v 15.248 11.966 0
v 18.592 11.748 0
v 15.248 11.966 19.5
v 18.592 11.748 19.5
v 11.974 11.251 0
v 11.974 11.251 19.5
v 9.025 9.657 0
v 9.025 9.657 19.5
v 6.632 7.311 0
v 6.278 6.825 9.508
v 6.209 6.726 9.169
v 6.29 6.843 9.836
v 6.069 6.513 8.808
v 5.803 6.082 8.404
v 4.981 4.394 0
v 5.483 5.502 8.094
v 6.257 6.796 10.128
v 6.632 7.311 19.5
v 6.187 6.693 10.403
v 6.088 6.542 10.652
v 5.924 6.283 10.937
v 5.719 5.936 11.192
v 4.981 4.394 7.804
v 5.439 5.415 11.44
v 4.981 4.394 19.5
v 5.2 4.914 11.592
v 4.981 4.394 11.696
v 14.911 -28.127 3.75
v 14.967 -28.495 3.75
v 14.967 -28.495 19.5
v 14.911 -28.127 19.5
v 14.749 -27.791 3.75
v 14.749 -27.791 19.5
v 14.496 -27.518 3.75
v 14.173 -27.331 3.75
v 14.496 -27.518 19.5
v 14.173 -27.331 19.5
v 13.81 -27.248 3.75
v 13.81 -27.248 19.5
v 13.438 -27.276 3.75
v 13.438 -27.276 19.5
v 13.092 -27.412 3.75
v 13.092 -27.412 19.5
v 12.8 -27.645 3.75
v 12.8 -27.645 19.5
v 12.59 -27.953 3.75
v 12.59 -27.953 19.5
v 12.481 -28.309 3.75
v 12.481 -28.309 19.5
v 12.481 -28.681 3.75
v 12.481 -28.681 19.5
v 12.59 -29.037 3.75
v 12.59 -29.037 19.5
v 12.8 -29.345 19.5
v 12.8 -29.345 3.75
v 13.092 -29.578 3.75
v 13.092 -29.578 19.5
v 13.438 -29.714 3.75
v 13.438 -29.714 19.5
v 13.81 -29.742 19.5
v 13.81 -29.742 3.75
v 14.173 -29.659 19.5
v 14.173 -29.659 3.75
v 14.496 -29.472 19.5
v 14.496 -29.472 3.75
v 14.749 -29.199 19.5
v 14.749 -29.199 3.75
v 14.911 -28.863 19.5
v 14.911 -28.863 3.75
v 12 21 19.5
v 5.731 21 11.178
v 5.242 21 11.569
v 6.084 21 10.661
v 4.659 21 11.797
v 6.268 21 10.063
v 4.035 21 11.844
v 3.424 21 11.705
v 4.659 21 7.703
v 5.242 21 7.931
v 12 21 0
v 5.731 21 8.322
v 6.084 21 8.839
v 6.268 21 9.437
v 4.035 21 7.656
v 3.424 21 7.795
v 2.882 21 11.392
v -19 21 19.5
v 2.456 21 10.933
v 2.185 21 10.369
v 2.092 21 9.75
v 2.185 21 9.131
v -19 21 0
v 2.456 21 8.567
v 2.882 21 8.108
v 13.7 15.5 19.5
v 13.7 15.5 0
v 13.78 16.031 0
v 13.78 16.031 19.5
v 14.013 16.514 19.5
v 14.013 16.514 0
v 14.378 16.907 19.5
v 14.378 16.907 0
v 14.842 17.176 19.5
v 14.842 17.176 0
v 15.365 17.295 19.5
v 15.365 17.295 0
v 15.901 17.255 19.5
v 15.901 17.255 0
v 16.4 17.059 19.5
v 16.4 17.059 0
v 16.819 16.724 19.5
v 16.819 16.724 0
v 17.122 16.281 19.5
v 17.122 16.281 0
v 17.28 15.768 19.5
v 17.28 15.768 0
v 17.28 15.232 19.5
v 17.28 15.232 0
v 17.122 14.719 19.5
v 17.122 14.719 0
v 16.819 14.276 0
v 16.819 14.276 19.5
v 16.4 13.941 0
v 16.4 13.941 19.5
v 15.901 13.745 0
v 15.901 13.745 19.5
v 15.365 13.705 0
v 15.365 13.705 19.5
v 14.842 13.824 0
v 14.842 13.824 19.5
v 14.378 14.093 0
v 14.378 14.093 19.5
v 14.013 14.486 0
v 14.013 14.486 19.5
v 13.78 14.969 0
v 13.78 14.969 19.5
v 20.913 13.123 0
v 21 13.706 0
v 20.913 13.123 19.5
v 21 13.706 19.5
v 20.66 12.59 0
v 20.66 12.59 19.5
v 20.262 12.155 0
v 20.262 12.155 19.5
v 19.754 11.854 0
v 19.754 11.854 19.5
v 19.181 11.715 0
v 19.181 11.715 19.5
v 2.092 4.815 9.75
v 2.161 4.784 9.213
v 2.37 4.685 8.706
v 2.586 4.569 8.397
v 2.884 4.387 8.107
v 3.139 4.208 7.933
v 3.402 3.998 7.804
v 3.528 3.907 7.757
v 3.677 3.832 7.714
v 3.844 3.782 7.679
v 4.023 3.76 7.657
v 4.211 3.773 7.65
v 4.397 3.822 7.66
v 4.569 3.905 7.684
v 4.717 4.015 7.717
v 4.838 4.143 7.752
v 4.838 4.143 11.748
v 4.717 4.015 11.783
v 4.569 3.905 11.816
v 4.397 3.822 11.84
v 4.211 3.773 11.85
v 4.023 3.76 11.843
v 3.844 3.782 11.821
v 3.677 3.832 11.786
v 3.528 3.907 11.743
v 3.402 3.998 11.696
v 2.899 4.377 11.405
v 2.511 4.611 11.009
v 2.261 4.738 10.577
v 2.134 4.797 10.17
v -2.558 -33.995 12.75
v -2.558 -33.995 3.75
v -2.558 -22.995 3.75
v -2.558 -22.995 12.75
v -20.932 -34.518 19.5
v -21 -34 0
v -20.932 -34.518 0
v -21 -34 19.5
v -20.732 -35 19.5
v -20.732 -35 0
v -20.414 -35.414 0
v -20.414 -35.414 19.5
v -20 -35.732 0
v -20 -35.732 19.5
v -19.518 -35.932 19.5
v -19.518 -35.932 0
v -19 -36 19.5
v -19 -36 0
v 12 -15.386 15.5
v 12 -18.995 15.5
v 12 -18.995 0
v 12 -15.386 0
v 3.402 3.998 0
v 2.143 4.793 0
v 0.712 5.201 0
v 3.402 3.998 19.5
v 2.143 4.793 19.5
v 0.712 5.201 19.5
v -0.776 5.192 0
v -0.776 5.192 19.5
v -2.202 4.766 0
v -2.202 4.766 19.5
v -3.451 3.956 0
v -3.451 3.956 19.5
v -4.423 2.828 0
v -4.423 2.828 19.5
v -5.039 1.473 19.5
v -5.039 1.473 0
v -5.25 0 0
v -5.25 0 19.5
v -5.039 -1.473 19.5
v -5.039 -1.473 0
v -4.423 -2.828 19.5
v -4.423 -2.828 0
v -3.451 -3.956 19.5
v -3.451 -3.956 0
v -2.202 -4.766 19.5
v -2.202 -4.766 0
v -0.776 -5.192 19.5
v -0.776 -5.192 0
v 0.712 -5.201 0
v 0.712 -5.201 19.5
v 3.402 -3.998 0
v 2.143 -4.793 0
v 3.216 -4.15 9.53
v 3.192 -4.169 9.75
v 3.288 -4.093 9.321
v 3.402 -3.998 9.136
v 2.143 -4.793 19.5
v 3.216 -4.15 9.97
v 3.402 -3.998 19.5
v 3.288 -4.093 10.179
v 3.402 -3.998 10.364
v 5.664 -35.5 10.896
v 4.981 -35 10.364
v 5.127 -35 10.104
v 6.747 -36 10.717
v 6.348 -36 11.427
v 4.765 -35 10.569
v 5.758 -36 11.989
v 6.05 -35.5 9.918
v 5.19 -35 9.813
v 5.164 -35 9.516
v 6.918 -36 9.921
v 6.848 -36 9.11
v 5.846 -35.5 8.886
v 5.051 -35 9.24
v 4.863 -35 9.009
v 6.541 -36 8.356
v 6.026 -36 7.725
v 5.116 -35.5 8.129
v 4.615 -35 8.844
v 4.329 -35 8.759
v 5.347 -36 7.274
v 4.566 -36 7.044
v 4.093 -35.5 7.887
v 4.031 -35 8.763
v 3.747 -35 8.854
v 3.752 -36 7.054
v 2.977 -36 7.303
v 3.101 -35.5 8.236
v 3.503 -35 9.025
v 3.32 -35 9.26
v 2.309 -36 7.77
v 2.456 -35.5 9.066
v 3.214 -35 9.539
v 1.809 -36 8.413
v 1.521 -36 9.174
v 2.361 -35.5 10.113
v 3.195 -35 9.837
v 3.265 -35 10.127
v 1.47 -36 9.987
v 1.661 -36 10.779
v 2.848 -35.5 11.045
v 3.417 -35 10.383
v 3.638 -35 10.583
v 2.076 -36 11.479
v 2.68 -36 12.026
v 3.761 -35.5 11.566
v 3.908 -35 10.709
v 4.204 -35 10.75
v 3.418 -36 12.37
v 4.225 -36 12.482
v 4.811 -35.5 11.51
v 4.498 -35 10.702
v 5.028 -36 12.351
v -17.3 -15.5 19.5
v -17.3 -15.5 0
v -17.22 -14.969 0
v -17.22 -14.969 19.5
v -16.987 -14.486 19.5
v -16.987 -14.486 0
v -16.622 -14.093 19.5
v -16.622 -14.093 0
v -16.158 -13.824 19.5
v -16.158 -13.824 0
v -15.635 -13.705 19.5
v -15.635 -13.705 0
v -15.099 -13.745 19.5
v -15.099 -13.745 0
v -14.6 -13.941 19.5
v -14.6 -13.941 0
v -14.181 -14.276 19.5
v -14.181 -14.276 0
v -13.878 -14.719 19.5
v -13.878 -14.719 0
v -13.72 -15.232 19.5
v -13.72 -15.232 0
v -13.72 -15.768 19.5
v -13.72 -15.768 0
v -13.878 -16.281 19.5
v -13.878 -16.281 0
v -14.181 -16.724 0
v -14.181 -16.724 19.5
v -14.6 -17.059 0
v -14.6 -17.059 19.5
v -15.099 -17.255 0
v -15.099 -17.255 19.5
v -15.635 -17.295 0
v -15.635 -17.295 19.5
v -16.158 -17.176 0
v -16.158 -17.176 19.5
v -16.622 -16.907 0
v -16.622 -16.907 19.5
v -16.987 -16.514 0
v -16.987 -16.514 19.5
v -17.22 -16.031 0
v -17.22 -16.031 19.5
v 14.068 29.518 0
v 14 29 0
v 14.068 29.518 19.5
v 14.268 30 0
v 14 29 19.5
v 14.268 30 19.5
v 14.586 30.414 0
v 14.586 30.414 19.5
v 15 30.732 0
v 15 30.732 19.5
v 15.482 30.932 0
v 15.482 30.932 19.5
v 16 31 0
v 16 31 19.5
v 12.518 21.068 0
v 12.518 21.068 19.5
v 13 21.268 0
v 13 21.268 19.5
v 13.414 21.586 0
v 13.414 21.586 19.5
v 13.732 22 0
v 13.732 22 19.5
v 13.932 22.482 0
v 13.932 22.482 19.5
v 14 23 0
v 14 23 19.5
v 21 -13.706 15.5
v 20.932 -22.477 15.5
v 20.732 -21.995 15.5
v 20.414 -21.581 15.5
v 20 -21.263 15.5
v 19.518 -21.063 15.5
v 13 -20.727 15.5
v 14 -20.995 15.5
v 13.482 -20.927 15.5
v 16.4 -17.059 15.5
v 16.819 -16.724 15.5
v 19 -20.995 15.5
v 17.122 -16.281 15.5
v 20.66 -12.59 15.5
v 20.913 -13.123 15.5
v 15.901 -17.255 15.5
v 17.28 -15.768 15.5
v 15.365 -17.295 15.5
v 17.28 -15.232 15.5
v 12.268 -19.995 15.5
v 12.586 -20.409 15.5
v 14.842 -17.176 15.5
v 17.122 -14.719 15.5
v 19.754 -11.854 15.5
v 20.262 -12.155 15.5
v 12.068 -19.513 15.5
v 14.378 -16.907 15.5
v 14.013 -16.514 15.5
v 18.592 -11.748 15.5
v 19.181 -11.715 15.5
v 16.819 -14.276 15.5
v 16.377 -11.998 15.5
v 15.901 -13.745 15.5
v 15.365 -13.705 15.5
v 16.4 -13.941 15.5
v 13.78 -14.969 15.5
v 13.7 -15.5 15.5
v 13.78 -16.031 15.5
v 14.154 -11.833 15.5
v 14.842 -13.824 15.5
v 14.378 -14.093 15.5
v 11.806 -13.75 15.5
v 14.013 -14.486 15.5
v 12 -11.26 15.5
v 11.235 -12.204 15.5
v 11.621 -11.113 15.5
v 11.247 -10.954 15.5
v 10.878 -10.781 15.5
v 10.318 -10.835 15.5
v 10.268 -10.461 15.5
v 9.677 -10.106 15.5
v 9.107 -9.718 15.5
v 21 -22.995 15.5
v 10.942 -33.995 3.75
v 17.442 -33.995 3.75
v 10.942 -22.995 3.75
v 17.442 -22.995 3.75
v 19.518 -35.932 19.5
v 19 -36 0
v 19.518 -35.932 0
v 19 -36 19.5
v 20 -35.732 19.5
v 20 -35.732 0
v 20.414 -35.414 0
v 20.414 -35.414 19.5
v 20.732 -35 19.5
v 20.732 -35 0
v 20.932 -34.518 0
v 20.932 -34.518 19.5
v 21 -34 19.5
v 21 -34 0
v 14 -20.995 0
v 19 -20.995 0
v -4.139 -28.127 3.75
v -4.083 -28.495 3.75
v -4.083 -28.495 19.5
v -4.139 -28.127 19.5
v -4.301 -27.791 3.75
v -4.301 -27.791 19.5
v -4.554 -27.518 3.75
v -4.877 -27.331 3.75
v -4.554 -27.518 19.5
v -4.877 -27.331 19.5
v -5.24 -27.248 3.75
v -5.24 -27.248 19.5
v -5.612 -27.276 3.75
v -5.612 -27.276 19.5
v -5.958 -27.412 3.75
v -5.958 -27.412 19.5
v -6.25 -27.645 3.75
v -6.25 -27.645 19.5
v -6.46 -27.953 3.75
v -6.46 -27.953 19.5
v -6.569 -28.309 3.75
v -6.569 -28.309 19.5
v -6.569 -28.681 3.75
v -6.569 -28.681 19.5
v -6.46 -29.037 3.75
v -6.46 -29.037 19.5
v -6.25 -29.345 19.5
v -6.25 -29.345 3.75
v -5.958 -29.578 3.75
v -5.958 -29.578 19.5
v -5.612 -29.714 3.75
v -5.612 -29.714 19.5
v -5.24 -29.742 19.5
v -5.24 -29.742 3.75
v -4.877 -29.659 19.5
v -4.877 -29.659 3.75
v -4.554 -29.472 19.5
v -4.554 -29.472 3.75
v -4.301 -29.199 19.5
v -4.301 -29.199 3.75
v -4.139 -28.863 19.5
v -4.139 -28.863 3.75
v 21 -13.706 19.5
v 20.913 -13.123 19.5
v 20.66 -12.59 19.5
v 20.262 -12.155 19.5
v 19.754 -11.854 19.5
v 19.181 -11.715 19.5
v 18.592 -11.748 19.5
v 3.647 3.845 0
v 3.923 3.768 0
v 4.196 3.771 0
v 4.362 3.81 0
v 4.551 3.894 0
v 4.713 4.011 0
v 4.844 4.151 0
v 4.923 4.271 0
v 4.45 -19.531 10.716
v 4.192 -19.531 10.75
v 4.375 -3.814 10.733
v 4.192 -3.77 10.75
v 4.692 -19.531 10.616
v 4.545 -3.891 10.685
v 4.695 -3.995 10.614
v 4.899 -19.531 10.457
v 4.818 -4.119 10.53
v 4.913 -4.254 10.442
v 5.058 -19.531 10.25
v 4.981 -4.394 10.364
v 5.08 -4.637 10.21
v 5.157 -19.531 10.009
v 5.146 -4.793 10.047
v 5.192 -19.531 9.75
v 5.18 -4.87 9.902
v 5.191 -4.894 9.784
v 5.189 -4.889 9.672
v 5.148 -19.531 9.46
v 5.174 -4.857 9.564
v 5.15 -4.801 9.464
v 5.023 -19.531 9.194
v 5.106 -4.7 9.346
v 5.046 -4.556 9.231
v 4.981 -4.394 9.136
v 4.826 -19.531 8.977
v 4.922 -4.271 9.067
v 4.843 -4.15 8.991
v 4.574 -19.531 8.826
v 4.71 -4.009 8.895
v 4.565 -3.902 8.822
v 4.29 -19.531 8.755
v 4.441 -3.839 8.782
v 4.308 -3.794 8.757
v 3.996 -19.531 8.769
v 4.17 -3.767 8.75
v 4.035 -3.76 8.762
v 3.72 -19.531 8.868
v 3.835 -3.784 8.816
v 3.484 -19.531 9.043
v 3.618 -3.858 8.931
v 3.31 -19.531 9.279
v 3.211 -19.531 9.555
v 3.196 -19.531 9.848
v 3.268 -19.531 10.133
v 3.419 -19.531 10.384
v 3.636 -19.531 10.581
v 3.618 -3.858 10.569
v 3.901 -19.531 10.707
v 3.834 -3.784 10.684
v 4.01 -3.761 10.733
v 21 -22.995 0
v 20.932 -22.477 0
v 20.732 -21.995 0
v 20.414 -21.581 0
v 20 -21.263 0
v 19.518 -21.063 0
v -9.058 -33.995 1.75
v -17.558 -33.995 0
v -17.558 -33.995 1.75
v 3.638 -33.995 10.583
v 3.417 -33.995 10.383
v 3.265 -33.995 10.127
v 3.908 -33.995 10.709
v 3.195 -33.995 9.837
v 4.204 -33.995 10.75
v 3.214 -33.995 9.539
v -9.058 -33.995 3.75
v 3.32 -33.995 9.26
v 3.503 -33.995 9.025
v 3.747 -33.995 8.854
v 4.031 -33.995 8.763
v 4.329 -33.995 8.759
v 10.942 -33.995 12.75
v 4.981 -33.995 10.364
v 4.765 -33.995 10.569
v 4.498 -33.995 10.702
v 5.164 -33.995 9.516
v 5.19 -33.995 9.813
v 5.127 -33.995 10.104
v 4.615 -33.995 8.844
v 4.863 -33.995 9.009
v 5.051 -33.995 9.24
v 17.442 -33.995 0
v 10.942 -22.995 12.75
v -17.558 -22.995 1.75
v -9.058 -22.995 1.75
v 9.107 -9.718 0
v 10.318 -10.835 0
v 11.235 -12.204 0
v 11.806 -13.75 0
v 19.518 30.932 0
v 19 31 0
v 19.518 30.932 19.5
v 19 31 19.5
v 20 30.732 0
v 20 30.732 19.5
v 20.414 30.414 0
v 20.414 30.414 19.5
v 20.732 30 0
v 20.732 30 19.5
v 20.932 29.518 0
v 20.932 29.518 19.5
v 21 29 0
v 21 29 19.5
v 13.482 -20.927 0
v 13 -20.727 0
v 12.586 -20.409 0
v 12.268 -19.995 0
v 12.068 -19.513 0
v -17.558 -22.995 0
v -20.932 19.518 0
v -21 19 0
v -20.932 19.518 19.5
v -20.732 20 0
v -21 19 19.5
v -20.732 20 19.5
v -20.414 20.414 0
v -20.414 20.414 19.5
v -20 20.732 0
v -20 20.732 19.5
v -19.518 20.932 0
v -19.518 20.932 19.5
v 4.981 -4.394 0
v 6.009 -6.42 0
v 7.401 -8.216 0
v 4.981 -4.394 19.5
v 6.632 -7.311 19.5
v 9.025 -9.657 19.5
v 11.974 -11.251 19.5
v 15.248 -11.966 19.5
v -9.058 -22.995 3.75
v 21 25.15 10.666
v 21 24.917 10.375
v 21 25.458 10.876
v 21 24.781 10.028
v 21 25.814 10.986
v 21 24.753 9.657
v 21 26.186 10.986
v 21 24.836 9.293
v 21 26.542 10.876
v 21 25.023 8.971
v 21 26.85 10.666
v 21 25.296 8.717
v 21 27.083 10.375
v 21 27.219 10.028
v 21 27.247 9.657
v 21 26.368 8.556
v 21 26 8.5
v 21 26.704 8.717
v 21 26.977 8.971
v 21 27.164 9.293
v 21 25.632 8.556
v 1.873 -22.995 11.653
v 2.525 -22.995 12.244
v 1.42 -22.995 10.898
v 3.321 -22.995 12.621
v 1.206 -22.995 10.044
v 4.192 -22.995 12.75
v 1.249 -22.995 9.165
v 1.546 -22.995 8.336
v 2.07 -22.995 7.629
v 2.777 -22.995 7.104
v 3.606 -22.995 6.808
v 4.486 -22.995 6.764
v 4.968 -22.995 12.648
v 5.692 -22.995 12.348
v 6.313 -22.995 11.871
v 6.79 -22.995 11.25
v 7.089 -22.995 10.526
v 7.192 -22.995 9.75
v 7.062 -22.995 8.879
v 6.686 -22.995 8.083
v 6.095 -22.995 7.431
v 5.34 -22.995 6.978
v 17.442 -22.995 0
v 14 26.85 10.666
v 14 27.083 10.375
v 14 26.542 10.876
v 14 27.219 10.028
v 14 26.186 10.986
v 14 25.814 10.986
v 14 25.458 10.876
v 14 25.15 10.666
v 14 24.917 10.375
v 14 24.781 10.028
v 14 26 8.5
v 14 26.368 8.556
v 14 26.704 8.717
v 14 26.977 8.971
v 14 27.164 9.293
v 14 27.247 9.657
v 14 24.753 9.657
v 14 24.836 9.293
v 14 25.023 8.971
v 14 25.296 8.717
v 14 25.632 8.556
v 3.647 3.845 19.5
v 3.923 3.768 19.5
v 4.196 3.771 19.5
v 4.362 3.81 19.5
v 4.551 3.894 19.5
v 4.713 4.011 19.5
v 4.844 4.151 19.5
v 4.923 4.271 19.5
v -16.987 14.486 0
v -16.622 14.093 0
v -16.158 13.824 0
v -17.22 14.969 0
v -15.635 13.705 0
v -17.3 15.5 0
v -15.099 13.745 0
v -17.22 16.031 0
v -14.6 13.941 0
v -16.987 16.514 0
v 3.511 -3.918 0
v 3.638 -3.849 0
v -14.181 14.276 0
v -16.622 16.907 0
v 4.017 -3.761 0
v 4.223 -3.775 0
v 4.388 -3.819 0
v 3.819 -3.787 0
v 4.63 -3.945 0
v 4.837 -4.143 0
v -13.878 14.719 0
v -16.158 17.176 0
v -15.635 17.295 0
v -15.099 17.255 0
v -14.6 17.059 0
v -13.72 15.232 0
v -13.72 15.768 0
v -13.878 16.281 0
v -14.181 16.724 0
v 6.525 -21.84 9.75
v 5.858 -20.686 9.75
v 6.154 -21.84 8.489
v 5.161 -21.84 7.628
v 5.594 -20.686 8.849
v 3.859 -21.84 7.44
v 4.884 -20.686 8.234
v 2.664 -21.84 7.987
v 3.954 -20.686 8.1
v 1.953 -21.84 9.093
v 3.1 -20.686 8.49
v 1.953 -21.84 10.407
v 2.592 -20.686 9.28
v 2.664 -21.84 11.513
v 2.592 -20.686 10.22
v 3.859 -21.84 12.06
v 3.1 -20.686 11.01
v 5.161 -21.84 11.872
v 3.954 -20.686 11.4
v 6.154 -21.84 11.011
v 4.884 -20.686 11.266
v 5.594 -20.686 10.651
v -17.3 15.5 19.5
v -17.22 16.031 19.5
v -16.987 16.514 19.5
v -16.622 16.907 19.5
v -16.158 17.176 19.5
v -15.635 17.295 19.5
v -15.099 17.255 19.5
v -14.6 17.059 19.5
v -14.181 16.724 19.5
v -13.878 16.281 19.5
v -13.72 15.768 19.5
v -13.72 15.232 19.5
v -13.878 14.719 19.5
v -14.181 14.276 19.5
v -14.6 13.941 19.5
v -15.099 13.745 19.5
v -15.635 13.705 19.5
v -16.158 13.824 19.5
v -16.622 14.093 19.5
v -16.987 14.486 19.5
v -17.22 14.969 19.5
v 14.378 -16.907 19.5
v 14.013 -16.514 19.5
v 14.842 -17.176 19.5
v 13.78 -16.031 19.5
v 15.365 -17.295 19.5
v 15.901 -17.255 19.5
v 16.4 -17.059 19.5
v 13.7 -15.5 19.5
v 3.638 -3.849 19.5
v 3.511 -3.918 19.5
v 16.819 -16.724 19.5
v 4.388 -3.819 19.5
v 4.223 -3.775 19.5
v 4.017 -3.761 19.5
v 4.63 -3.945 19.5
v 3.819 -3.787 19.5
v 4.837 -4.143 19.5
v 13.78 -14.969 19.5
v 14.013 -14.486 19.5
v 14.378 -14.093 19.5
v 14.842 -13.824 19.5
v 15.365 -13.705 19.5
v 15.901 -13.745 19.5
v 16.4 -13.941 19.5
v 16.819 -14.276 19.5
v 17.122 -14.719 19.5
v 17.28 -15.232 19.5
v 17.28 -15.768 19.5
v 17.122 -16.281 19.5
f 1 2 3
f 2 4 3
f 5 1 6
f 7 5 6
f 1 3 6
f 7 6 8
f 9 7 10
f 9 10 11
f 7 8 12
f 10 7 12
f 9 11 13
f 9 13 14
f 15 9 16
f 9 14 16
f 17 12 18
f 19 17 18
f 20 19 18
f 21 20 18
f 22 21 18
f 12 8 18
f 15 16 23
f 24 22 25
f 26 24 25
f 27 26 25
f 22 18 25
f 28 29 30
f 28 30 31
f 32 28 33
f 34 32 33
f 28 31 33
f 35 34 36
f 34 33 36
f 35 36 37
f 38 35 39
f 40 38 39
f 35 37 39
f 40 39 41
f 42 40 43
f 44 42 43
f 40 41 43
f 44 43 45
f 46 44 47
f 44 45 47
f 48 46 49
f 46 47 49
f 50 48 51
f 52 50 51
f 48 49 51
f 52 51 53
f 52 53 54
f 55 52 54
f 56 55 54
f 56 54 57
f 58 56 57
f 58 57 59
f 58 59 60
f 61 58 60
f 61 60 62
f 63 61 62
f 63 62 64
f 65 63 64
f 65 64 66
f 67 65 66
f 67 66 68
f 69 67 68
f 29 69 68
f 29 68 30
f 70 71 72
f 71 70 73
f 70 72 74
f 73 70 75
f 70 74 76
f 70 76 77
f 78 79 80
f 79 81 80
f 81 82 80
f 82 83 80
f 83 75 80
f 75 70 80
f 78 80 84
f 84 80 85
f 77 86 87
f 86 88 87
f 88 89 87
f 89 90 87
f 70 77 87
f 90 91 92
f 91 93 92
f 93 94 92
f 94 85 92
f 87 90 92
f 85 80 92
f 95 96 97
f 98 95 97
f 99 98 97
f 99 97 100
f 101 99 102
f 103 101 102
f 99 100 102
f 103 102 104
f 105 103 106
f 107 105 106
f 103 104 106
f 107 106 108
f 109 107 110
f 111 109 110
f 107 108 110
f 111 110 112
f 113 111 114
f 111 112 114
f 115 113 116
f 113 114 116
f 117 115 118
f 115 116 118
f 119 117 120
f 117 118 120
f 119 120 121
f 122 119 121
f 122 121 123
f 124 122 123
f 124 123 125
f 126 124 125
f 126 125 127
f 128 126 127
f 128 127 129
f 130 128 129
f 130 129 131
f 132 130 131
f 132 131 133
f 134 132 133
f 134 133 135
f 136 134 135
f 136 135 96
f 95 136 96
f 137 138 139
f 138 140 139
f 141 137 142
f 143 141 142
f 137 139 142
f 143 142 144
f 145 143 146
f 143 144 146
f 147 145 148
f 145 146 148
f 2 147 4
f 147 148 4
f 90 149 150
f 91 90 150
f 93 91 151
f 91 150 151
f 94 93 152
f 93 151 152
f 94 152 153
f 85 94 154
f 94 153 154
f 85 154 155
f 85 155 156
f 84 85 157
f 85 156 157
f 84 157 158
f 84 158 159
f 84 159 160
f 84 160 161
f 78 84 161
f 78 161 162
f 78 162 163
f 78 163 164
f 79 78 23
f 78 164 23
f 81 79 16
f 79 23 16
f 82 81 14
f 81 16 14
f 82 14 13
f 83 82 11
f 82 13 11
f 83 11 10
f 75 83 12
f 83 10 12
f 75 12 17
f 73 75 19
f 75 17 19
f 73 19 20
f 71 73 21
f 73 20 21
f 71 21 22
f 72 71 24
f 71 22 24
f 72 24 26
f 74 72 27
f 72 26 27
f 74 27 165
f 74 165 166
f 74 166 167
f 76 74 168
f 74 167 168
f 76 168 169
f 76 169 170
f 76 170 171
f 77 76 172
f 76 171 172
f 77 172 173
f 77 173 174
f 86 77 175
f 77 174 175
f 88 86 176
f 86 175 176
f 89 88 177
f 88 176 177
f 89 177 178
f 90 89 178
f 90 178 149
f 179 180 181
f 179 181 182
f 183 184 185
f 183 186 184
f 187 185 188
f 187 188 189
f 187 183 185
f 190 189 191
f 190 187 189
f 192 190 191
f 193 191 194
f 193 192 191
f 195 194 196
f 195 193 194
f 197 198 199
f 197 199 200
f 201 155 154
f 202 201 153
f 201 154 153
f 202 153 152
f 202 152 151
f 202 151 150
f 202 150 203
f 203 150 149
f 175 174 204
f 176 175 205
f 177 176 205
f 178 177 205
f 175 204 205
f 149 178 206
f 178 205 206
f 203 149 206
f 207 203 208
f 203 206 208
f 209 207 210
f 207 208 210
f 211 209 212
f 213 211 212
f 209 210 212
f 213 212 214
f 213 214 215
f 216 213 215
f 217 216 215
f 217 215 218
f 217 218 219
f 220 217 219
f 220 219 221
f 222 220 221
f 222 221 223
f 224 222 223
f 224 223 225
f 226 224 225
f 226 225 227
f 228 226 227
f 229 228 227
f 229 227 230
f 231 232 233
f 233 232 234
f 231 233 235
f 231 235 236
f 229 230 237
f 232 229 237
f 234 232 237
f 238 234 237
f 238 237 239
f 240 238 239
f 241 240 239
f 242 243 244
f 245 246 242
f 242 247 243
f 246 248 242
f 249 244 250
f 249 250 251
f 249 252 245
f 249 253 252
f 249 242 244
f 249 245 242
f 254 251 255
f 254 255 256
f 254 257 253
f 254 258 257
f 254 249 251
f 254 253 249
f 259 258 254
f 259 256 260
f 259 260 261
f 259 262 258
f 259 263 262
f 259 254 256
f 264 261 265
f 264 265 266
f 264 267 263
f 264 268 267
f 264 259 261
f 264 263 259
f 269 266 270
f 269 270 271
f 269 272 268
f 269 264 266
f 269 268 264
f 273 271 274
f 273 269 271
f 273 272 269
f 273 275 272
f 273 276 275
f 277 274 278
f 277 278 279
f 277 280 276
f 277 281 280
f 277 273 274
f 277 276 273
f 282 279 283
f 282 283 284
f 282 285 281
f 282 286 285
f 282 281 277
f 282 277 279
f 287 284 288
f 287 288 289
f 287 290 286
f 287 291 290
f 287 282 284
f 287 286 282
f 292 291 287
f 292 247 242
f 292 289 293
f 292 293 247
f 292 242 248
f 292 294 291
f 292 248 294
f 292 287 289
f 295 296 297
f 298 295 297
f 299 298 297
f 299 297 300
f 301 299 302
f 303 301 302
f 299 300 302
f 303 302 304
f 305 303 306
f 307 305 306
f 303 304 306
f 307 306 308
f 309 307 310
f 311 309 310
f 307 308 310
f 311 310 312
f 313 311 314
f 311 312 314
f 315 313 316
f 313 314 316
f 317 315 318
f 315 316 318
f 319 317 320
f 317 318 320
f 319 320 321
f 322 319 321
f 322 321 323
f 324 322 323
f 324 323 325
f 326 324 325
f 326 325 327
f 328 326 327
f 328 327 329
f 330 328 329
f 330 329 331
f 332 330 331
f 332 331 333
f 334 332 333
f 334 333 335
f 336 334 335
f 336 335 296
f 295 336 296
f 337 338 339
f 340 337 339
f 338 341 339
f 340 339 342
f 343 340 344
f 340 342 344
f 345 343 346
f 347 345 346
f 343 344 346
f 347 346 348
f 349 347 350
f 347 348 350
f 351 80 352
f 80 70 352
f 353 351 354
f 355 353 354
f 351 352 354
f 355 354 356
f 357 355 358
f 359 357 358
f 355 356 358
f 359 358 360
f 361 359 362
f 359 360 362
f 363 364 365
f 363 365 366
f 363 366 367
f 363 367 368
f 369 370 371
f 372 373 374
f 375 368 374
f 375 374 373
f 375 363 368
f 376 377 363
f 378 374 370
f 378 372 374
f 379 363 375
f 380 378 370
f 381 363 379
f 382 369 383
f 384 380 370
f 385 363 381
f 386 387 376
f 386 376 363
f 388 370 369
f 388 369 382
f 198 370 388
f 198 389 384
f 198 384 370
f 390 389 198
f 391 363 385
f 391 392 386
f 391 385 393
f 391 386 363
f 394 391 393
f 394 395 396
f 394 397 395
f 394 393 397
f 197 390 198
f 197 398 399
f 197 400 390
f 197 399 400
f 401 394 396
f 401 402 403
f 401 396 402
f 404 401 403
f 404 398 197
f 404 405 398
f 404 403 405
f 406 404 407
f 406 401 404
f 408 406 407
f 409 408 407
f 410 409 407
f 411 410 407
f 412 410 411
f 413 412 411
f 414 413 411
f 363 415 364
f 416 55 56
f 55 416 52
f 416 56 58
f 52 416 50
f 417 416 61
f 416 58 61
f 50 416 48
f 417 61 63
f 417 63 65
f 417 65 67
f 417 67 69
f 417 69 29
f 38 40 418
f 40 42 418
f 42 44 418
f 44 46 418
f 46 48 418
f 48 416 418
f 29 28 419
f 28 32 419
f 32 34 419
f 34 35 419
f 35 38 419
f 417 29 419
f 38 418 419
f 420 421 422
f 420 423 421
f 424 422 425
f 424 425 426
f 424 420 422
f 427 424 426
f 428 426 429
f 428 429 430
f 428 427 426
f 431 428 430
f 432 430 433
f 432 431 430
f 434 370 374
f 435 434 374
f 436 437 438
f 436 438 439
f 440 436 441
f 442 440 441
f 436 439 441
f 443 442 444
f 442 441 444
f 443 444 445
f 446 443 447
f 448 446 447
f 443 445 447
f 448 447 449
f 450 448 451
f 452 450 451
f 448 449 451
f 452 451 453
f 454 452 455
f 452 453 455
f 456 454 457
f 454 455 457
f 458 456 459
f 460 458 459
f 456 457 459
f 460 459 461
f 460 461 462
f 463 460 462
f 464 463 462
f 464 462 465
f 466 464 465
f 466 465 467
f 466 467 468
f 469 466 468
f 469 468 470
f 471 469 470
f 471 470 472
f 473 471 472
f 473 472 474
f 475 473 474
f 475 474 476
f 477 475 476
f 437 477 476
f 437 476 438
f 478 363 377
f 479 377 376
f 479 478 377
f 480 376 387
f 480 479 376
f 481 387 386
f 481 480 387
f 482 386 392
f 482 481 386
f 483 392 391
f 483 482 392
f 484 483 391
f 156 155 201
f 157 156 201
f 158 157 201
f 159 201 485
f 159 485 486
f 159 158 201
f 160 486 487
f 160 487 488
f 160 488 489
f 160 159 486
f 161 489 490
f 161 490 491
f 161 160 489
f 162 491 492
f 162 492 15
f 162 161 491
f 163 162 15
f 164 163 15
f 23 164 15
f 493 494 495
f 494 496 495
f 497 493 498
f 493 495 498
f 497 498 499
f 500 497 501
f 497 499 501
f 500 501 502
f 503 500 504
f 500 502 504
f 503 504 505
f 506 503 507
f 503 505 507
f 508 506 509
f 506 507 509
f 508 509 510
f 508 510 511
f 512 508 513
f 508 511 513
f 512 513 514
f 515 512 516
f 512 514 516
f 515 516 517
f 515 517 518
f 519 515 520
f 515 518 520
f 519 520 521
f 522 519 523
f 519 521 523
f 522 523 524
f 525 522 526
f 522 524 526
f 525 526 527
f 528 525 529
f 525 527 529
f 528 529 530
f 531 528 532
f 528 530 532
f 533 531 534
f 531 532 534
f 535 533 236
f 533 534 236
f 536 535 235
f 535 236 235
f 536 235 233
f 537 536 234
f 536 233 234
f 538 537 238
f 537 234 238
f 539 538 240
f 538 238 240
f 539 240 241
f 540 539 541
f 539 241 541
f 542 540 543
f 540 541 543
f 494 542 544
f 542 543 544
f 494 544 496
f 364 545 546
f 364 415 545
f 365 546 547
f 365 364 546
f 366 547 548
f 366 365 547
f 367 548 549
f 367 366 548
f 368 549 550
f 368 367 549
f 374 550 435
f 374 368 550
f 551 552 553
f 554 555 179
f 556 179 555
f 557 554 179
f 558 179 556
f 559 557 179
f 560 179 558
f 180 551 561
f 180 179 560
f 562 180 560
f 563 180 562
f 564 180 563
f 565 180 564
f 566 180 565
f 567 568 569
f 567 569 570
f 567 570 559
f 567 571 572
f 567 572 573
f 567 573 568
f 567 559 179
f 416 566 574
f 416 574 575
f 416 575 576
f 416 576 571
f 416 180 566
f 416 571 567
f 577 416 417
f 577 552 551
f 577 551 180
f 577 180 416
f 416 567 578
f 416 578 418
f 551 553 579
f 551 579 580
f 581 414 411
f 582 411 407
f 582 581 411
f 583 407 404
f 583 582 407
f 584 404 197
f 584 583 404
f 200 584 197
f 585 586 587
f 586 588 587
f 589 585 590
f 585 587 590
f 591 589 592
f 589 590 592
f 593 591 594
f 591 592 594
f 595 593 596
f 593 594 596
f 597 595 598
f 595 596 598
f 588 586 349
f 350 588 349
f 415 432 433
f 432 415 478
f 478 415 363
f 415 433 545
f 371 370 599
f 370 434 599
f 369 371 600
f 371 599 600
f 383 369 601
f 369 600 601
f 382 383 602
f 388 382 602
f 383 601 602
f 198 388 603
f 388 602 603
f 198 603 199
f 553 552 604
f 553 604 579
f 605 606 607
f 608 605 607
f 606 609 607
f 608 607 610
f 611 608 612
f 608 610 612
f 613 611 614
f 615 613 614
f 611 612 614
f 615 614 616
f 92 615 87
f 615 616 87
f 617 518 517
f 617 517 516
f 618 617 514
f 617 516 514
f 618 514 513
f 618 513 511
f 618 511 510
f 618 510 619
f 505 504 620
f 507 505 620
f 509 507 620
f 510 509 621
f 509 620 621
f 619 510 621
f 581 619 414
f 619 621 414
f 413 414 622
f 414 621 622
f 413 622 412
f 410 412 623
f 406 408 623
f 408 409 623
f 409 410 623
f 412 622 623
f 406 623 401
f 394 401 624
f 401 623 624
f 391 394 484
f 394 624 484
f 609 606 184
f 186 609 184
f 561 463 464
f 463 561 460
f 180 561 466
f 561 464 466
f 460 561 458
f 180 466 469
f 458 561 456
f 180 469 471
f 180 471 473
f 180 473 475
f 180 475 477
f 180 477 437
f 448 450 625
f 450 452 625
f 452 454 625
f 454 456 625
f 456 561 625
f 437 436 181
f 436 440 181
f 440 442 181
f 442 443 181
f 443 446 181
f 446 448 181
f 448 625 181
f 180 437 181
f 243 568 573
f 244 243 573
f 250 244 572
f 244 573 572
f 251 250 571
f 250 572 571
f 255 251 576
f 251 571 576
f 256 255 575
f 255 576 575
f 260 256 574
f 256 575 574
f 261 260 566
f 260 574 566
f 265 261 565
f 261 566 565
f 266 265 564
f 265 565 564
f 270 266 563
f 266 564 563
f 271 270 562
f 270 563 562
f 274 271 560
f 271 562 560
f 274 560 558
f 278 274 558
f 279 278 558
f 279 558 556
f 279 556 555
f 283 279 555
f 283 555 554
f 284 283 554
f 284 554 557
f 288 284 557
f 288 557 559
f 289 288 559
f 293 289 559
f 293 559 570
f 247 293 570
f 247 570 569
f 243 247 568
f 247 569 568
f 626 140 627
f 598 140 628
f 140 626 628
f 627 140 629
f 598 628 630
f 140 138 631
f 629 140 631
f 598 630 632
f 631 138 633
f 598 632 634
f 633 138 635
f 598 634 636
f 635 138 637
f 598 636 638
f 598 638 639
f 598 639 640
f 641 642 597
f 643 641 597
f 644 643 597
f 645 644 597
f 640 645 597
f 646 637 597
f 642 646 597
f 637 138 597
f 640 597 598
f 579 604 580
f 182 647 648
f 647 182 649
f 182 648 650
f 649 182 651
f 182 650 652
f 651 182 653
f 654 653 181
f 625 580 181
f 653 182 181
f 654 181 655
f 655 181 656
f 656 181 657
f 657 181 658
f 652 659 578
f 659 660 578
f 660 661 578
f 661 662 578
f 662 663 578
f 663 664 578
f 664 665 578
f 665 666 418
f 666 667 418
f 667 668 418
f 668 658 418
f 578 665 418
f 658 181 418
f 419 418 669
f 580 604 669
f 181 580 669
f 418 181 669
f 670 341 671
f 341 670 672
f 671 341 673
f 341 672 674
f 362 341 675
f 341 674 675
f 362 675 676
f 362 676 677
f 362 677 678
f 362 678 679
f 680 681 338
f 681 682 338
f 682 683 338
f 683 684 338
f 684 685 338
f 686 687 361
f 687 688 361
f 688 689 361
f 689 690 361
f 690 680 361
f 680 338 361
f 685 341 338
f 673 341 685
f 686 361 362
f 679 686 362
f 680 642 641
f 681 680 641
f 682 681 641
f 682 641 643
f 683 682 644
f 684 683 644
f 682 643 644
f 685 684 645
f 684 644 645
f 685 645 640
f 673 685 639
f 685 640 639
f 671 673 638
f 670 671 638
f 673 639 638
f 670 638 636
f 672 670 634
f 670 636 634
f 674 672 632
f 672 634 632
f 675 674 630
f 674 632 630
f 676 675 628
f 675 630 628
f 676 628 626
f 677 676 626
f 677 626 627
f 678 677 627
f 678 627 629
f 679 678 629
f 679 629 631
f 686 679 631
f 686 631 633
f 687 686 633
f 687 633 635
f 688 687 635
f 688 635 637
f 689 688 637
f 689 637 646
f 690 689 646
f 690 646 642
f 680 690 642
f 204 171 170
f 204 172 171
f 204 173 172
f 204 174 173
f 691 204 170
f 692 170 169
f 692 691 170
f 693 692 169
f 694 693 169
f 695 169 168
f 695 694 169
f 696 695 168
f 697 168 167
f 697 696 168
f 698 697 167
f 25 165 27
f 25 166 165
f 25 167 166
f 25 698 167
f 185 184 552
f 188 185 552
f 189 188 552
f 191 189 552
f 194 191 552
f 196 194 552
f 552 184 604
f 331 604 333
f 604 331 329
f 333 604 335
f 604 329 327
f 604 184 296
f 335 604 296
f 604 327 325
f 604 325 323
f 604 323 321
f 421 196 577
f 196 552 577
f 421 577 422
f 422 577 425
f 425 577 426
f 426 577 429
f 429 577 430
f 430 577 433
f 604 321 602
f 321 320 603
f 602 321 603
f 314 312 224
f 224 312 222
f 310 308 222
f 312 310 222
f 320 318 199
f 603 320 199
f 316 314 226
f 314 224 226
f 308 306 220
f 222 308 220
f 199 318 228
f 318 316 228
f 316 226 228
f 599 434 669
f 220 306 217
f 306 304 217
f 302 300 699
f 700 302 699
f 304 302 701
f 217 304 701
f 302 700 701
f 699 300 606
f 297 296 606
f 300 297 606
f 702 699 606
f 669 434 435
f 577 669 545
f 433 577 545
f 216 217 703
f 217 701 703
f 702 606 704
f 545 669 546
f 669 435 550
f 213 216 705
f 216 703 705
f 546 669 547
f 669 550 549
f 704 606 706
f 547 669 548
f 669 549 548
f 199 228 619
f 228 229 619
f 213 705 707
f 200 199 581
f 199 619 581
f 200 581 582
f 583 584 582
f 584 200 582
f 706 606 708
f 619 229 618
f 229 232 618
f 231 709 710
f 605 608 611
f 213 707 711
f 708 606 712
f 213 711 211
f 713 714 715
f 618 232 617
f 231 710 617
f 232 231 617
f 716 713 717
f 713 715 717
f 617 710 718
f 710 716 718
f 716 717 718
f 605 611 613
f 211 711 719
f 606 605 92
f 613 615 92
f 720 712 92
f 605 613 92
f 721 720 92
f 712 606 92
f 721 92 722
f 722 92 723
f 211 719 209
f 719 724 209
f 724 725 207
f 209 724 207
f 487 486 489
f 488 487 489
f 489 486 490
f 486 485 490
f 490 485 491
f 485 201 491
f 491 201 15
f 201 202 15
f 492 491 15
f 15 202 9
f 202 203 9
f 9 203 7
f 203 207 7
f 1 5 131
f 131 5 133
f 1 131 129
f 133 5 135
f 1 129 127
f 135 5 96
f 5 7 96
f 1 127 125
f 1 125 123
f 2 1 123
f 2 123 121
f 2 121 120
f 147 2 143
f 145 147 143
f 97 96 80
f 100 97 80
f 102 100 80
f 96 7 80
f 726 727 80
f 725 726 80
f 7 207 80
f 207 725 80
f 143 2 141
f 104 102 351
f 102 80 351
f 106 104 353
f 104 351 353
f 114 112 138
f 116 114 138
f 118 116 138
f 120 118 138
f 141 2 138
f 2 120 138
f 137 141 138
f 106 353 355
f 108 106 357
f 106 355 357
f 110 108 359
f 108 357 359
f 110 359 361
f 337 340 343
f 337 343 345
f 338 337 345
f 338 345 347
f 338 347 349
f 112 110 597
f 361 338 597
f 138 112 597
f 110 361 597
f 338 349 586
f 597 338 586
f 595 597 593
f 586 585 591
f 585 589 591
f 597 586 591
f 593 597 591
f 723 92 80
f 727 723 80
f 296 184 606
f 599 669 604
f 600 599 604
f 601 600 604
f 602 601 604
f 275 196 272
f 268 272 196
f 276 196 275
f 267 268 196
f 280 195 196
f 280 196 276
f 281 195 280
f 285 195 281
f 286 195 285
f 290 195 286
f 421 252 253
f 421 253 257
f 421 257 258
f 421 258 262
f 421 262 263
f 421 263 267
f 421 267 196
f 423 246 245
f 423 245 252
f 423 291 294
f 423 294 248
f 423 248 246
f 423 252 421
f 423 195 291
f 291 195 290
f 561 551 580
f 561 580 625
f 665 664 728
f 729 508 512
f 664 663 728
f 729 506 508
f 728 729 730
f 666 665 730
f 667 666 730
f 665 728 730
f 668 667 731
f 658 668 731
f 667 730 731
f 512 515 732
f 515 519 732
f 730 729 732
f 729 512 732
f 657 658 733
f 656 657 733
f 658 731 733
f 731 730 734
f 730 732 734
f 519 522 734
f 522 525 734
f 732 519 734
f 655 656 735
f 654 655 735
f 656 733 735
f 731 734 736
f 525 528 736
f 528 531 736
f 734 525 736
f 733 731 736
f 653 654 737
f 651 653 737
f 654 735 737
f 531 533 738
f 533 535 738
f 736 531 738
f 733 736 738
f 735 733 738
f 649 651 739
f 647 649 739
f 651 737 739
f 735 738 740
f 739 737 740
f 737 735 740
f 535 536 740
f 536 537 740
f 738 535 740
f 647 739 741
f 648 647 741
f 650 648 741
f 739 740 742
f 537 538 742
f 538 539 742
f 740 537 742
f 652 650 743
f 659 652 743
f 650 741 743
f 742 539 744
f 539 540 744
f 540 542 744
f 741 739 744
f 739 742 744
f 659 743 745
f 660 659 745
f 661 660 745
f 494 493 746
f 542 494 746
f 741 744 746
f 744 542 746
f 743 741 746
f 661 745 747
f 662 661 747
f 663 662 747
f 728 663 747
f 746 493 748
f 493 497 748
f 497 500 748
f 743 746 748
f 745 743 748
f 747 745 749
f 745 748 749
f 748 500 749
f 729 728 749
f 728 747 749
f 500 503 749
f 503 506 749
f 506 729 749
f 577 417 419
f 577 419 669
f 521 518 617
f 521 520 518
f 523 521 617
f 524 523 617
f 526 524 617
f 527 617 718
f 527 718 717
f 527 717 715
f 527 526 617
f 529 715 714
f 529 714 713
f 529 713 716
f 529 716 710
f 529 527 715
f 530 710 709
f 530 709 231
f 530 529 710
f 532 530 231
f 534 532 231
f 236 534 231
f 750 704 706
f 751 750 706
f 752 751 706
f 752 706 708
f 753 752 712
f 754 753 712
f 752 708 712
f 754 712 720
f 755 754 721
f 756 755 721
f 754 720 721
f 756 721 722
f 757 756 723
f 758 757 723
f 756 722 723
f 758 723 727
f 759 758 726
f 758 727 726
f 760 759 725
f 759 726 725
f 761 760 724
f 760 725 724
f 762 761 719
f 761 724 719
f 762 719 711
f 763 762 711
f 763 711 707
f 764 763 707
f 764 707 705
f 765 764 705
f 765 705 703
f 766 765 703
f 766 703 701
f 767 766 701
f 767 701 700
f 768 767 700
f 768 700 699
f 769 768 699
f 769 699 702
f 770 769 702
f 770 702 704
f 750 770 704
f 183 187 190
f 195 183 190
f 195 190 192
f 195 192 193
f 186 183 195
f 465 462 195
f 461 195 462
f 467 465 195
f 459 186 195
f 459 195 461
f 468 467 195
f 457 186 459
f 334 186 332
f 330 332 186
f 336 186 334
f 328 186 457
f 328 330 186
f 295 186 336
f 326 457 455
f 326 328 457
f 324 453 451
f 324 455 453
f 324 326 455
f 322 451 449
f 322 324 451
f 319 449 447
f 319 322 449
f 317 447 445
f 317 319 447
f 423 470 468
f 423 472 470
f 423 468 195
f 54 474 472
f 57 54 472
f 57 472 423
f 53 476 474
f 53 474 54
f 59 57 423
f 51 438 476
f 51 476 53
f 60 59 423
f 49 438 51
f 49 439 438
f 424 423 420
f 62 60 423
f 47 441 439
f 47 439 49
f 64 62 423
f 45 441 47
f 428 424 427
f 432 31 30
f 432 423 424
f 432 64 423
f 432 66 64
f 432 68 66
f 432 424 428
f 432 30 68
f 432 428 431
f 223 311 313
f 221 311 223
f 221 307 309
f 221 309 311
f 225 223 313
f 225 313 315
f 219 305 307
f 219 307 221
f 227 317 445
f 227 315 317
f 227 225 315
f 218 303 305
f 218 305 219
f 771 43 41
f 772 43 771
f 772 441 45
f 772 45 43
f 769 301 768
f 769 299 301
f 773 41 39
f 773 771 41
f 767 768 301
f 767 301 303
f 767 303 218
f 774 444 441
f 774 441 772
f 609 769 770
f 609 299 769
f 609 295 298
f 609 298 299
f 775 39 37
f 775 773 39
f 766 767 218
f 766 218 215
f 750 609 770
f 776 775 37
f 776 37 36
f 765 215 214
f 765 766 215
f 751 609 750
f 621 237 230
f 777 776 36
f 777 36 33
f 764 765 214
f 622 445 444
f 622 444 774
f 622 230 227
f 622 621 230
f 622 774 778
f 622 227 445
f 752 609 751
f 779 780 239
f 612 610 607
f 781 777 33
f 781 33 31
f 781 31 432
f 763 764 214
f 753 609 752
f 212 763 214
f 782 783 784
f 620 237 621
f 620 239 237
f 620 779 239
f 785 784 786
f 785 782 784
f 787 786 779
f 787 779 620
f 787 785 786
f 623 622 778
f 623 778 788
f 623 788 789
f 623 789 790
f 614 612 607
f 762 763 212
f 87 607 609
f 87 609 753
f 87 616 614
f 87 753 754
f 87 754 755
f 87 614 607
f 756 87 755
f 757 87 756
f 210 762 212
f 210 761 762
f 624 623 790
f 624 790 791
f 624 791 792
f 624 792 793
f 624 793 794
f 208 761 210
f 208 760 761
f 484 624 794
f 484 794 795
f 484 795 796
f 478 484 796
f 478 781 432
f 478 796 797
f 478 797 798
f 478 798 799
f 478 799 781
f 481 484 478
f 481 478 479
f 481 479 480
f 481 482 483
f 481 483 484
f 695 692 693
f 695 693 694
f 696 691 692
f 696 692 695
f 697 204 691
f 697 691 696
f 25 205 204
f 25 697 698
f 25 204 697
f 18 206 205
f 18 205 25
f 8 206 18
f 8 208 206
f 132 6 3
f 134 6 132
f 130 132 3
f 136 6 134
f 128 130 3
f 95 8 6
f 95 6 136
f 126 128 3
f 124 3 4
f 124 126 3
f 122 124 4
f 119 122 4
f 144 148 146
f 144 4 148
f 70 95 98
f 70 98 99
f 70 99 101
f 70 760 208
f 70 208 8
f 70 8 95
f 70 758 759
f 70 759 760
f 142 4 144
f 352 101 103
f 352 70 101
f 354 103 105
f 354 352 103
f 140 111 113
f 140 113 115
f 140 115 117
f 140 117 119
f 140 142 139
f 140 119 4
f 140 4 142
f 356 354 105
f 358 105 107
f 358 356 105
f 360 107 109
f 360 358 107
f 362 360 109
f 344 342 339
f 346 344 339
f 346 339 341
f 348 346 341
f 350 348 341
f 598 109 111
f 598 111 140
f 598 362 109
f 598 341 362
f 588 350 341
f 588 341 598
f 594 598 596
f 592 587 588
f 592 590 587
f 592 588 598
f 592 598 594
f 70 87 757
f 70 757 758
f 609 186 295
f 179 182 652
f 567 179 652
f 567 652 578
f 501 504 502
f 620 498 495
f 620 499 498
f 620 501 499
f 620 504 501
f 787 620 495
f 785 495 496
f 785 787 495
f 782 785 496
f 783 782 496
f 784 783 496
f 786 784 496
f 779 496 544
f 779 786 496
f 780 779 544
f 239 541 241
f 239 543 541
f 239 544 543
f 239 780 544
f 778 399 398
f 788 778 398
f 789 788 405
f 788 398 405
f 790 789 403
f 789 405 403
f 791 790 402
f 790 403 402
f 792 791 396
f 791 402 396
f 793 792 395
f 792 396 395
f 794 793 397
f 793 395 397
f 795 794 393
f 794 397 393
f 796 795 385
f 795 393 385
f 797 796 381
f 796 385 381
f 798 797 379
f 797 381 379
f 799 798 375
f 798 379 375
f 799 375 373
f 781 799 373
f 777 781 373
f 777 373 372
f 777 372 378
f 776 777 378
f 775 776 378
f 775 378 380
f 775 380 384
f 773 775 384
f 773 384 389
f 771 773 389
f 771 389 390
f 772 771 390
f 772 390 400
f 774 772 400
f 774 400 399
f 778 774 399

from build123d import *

# Parameters (mm, degrees)
BOSS_EXTRUDE1_DEPTH       = 19.5
SKETCH2_R                 = 5.25
HOBB_CLEARANCE_DEPTH      = 22
M3_CLEARANCE_HOLE1_D      = 3.6
SKETCH6_R                 = 12
CUT_EXTRUDE2_DEPTH        = 22
CUT_EXTRUDE3_START        = 15.5
CUT_EXTRUDE3_DEPTH        = 15.5
M3X0_5_TAPPED_HOLE1_D     = 2.5
FILLET1_R                 = 1
M5X0_8_TAPPED_HOLE1_D     = 4.2
M5X0_8_TAPPED_HOLE1_DEPTH = 21
M5X0_8_TAPPED_HOLE1_TIP   = 1.2618073
SKETCH12_R                = 1
CUT_EXTRUDE4_DEPTH        = 51.845353932
BOSS_EXTRUDE2_DEPTH       = 15
BOSS_EXTRUDE2_DEPTH_BACK  = 0.005
SKETCH14_W                = 42
SKETCH14_H                = 19.5
SKETCH15_R                = 1
CUT_EXTRUDE6_DEPTH        = 26.51413021
CUT_EXTRUDE7_START        = -2
CUT_EXTRUDE7_DEPTH        = 11
M3X0_5_TAPPED_HOLE2_D     = 2.5
FILLET3_R                 = 2
CHAMFER2_SIZE             = 1
CHAMFER2_SIZE2            = 1.732050808
FILLET4_START             = -1
FILLET4_DEPTH             = 16.5


with BuildPart() as part:
    # Sketch1 → Boss-Extrude1 (new body)
    with BuildSketch(Plane.XY):
        Polygon((21, -21), (21, 31), (14, 31), (14, 21), (-21, 21), (-21, -21), align=None)
    extrude(amount=BOSS_EXTRUDE1_DEPTH)

    # Sketch2 → Hobb Clearance (cut)
    with BuildSketch(Plane.XY.offset(19.5)):
        Circle(SKETCH2_R)
    extrude(amount=-HOBB_CLEARANCE_DEPTH, mode=Mode.SUBTRACT)

    # M3 Clearance Hole1 (through all)
    with Locations(Plane.XY.offset(19.5)):
        with Locations((-15.5, 15.5), (15.5, 15.5), (15.5, -15.5), (-15.5, -15.5)):
            Hole(M3_CLEARANCE_HOLE1_D / 2)

    # Sketch6 → Cut-Extrude2 (cut)
    with BuildSketch(Plane.XY.offset(19.5)):
        with Locations((16.1475, 0)):
            Circle(SKETCH6_R)
    extrude(amount=-CUT_EXTRUDE2_DEPTH, mode=Mode.SUBTRACT)

    # Sketch7 → Cut-Extrude3 (cut)
    with BuildSketch(Plane.XY.offset(CUT_EXTRUDE3_START)):
        with BuildLine():
            Line((21, -10.975119305), (21, -21))
            Line((21, -21), (12, -21))
            Line((12, -21), (12, -11.260472626))
            ThreePointArc((12, -11.260472626), (16.527780001, -11.99397295), (21, -10.975119305))
        make_face()
    extrude(amount=-CUT_EXTRUDE3_DEPTH, mode=Mode.SUBTRACT)

    # M3x0.5 Tapped Hole1 (through all)
    with Locations(Plane.ZY.offset(-14)):
        with Locations((9.75, 26)):
            Hole(M3X0_5_TAPPED_HOLE1_D / 2)

    # Fillet1
    fillet1_edges = [part.edges().sort_by_distance(p)[0] for p in [
        (4.468315722, -2.756202933, 9.75),
        (4.468315722, 2.756202933, 9.75),
    ]]
    fillet(fillet1_edges, radius=FILLET1_R)

    # M5x0.8 Tapped Hole1
    with Locations(Plane(origin=(0, 21, 0), x_dir=(1, 0, 0), z_dir=(0, 1, 0))):
        with Locations((4.191547948, -9.75)):
            Hole(M5X0_8_TAPPED_HOLE1_D / 2, depth=M5X0_8_TAPPED_HOLE1_DEPTH)
            with Locations((0, 0, -(M5X0_8_TAPPED_HOLE1_DEPTH + M5X0_8_TAPPED_HOLE1_TIP / 2))):  # 118° drill point
                Cone(0, M5X0_8_TAPPED_HOLE1_D / 2, M5X0_8_TAPPED_HOLE1_TIP, mode=Mode.SUBTRACT)

    # Sketch12 → Cut-Extrude4 (cut, through all)
    with BuildSketch(Plane(origin=(0, 21, 0), x_dir=(1, 0, 0), z_dir=(0, 1, 0))):
        with Locations(Location((4.191547948, -9.75, 0), (0, 0, 270))):
            Circle(SKETCH12_R)
    extrude(amount=-CUT_EXTRUDE4_DEPTH, mode=Mode.SUBTRACT)

    # Sketch14 → Boss-Extrude2 (add, two sides: drawn at the far end of the back side and taken through both)
    with BuildSketch(Plane.XZ.offset(21).offset(-BOSS_EXTRUDE2_DEPTH_BACK)):
        with Locations((0, 9.75)):
            Rectangle(SKETCH14_W, SKETCH14_H)
    extrude(amount=BOSS_EXTRUDE2_DEPTH + BOSS_EXTRUDE2_DEPTH_BACK)

    # Sketch15 → Cut-Extrude6 (cut)
    with BuildSketch(Plane(origin=(0, -20.995, 0), x_dir=(1, 0, 0), z_dir=(0, 1, 0))):
        with Locations(Location((4.191547948, -9.75, 0), (0, 0, 322.12020771))):
            Circle(SKETCH15_R)
    extrude(amount=-CUT_EXTRUDE6_DEPTH, mode=Mode.SUBTRACT)

    # Sketch16 → Cut-Extrude7 (cut)
    with BuildSketch(Plane(origin=(0, -20.995, 0), x_dir=(1, 0, 0), z_dir=(0, 1, 0)).offset(CUT_EXTRUDE7_START)):
        Polygon((-17.558452052, -1.75), (-9.058452052, -1.75), (-9.058452052, -3.75), (-8.058452052, -3.75), (-2.558452052, -3.75), (-2.558452052, -12.75), (2.691547948, -12.75), (5.691547948, -12.75), (10.941547948, -12.75), (10.941547948, -3.75), (16.441547948, -3.75), (17.441547948, -3.75), (17.441547948, 0), (-17.558452052, 0), (-17.558452052, -0.75), align=None)
    extrude(amount=-CUT_EXTRUDE7_DEPTH, mode=Mode.SUBTRACT)

    # M3x0.5 Tapped Hole2 (through all)
    with Locations(Plane(origin=(0, 0, 3.75), x_dir=(-1, 0, 0), z_dir=(0, 0, -1))):
        with Locations((5.333452052, -28.495), (-13.716547948, -28.495)):
            Hole(M3X0_5_TAPPED_HOLE2_D / 2)

    # Chamfer1: read off the stored shape, not the designer's step
    # Chamfer1 outline → Chamfer1 (revolve, cut)
    with BuildSketch(Plane(origin=(4.191547948, 0, 9.75), x_dir=(1, 0, 0), z_dir=(0, 0, 1))):
        Polygon((3, -22.995), (1, -19.530898385), (1, -22.995), align=None)
    revolve(axis=Axis((4.191547948, 0, 9.75), (0, 1, 0)), mode=Mode.SUBTRACT)

    # Fillet3
    fillet3_edges = [part.edges().sort_by_distance(p)[0] for p in [
        (21, -20.995, 7.75),
        (12, -20.995, 7.75),
        (-21, -36, 9.75),
        (21, -36, 9.75),
        (-21, 21, 9.75),
        (21, 10.975119305, 9.75),
        (21, -10.975119305, 17.5),
        (12, -11.260472626, 7.75),
        (14, 31, 9.75),
        (21, 31, 9.75),
        (14, 21, 9.75),
    ]]
    fillet(fillet3_edges, radius=FILLET3_R)

    # Chamfer2
    chamfer2_edges = [part.edges().sort_by_distance(p)[0] for p in [
        (3.40224726, -36, 9.135993141),
    ]]
    chamfer2_side = [part.faces().sort_by_distance(p)[0] for p in [
        (3.40224726, -34.9975, 9.135993141),
    ]]
    chamfer(chamfer2_edges, length=CHAMFER2_SIZE, length2=CHAMFER2_SIZE2, reference=chamfer2_side[0])

    # Fillet4: read off the stored shape, not the designer's step
    # Fillet4 outline → Fillet4 (cut)
    with BuildSketch(Plane.XY.offset(FILLET4_START)):
        with BuildLine():
            ThreePointArc((9.106973684, -9.717560867), (11.234934474, -12.204064485), (12, -15.386138039))
            Line((12, -15.386138039), (12, -12.578085854))
            ThreePointArc((12, -12.578085854), (11.696530072, -11.518941995), (10.878214286, -10.781216446))
            ThreePointArc((10.878214286, -10.781216446), (9.969659856, -10.28757946), (9.106973684, -9.717560867))
        make_face()
    extrude(amount=FILLET4_DEPTH, mode=Mode.SUBTRACT)


solid = part.part
